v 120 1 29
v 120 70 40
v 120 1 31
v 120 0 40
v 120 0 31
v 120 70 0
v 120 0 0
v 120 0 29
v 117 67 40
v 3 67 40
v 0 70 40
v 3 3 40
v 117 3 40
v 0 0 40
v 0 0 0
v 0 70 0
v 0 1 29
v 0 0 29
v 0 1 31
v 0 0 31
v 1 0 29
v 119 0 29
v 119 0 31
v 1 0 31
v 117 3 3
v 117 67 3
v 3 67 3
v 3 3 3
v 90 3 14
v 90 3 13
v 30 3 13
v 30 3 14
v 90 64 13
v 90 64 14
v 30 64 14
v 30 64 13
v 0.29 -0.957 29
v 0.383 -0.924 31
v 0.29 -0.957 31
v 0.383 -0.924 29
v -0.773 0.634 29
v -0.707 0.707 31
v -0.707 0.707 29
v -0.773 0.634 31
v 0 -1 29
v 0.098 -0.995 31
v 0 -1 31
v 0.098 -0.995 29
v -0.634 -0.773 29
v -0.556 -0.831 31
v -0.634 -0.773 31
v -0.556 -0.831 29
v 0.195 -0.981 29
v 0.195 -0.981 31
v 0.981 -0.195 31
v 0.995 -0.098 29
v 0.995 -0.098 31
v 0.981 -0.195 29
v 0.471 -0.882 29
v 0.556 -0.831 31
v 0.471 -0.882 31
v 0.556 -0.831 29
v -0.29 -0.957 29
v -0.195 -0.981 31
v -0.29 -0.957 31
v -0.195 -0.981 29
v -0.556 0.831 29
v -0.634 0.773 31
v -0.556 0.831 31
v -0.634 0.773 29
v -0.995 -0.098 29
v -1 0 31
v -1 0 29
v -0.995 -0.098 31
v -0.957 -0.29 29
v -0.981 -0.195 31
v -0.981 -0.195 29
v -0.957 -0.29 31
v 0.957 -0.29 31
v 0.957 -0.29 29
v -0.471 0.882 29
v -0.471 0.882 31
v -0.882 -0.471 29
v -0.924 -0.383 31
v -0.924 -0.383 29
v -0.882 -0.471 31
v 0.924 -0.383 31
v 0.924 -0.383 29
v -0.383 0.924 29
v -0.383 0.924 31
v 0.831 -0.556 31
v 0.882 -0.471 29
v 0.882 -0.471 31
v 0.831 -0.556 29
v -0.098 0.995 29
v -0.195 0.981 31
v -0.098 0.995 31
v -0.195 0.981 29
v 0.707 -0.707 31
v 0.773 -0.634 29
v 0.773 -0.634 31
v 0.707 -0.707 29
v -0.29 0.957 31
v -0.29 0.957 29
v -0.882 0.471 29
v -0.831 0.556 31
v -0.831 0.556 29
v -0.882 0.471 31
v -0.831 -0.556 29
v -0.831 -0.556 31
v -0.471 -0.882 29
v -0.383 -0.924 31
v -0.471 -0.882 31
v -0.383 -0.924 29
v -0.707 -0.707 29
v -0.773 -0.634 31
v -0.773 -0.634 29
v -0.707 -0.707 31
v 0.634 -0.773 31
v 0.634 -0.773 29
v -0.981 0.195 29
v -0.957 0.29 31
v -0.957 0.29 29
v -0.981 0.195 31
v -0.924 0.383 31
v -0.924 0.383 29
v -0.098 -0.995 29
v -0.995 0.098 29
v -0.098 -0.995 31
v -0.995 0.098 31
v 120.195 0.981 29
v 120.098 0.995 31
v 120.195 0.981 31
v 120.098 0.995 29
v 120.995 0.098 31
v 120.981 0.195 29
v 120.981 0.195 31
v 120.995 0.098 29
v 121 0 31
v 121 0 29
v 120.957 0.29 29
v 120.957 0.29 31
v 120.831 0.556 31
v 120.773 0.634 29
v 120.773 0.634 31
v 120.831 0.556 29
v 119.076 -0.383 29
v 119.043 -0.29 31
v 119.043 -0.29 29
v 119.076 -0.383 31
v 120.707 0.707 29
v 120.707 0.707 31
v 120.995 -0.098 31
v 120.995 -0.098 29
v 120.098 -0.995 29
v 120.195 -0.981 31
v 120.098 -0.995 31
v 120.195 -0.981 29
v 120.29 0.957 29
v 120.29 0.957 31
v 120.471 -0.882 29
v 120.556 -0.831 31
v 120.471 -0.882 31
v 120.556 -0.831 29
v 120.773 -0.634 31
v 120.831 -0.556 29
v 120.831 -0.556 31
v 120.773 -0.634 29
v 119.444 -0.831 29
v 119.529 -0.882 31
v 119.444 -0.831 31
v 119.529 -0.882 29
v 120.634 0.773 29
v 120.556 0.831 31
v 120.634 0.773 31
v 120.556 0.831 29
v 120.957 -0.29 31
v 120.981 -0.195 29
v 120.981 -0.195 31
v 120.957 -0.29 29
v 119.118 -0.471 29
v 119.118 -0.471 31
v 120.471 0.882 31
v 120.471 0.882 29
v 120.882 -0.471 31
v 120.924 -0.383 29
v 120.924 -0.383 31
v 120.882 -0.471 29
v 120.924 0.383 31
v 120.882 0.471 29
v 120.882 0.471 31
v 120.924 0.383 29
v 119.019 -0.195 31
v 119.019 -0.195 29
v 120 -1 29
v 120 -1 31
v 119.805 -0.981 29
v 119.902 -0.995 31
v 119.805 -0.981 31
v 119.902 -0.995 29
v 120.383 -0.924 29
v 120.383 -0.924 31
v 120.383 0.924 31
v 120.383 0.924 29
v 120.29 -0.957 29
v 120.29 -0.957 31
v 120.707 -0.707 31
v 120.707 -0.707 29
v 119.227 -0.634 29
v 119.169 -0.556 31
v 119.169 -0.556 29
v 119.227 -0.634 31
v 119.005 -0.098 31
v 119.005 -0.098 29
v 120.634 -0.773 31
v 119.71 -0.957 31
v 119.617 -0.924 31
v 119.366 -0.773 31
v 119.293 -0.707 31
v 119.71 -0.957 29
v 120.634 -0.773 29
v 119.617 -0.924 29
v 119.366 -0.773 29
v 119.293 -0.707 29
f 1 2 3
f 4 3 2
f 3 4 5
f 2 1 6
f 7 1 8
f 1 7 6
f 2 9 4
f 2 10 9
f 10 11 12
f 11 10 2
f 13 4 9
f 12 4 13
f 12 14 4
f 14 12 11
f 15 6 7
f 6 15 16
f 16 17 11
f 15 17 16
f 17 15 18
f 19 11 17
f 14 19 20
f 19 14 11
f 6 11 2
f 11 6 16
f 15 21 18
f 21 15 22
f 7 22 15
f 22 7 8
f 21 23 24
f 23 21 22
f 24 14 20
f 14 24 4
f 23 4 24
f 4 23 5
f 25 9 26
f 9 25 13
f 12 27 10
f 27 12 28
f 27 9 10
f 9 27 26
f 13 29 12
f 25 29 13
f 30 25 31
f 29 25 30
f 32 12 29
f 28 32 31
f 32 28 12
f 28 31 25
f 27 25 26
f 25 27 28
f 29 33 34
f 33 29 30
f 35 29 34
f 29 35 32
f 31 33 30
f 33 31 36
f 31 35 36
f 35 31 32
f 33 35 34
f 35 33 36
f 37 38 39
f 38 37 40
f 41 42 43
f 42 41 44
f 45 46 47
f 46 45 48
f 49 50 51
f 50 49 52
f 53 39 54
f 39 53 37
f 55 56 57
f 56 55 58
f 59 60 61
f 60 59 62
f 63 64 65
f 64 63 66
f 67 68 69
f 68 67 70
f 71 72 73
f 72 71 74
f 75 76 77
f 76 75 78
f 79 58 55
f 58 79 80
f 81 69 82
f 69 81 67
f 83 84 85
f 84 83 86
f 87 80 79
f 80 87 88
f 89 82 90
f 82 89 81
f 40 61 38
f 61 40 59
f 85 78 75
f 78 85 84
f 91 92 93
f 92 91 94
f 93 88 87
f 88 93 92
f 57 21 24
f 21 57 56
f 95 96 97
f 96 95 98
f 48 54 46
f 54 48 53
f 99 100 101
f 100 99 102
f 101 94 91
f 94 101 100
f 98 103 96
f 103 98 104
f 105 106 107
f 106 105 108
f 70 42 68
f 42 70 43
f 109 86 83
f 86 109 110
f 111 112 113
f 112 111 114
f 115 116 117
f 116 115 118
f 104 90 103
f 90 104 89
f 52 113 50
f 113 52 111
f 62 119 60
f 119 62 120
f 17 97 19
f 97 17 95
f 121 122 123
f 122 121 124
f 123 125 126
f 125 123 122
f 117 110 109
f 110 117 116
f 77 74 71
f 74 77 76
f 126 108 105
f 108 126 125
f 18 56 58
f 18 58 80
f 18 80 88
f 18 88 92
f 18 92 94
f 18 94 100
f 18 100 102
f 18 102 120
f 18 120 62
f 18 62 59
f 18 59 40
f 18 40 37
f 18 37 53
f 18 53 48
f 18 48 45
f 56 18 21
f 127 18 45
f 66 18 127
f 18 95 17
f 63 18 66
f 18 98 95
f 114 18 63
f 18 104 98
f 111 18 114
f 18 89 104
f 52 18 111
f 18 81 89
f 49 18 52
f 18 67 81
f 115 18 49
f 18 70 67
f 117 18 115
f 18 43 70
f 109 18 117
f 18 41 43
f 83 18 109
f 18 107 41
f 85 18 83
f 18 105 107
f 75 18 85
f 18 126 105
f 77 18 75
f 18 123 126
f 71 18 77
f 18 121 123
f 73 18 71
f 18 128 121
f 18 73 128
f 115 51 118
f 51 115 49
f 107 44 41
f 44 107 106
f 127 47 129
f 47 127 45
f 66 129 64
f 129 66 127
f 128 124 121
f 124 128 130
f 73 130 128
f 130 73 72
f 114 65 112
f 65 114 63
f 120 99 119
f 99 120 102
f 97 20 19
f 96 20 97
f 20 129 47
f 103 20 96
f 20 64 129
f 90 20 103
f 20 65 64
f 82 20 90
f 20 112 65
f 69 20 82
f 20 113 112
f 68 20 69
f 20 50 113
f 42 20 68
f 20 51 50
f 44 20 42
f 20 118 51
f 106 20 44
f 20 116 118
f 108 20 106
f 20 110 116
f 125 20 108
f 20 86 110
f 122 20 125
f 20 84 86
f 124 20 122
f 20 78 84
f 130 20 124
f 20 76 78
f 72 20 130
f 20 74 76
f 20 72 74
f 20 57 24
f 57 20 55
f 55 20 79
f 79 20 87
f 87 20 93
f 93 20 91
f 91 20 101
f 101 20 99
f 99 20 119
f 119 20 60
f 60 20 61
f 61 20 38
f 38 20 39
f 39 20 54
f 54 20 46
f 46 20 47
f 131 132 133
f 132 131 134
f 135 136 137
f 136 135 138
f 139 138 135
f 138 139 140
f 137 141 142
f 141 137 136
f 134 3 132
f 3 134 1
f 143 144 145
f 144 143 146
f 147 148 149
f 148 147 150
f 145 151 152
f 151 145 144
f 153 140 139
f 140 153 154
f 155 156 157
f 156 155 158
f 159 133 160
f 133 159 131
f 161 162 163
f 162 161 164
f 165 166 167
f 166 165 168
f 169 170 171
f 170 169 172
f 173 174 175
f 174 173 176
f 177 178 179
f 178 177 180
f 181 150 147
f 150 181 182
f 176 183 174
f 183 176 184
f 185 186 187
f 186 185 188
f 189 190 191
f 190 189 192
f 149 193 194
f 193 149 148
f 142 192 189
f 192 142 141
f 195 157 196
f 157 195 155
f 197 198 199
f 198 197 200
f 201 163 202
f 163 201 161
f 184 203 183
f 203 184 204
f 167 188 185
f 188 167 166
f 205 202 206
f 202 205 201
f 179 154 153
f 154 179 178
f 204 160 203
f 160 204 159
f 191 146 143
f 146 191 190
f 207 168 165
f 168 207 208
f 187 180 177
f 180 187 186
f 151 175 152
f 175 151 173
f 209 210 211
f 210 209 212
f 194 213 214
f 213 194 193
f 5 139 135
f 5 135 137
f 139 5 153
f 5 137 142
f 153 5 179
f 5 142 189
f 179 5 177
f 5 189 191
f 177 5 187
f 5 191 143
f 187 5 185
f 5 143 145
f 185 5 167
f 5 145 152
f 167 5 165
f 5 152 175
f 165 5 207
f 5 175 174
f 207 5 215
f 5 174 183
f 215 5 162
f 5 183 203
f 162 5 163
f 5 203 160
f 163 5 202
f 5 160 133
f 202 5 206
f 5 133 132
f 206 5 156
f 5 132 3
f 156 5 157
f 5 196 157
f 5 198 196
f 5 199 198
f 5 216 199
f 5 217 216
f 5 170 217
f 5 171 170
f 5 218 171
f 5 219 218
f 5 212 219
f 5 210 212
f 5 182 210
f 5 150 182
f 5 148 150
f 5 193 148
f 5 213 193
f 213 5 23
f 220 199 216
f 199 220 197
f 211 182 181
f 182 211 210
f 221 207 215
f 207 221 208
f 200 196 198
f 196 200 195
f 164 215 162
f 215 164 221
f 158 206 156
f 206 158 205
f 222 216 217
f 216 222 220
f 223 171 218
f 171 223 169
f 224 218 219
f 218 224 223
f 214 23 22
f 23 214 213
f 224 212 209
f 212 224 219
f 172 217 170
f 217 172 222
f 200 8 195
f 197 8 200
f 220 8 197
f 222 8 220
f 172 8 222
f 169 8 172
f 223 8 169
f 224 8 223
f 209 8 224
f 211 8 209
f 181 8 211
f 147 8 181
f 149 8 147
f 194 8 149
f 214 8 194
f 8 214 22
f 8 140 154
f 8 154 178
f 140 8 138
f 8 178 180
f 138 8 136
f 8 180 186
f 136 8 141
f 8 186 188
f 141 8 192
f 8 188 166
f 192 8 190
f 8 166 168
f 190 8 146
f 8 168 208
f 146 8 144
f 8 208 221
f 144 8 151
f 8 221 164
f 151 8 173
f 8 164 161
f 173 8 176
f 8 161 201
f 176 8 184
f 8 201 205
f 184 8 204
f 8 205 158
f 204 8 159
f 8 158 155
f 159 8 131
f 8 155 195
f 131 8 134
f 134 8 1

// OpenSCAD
// Buffer Tank Design for Mini Horizontal Gel-Electrophoresis Box - CORRECTED VERSION

// --- Dimensions ---
X_outer = 120;    // Outer length of the tank (mm)
Y_outer = 70;     // Outer width of the tank (mm)
Z_outer = 40;     // Outer height of the tank (mm)
Wall_thickness = 3; // Thickness of the walls (mm)
Floor_thickness = 3; // Thickness of the floor (mm)

Platform_length = 60;  // Length of the central platform in X (mm)
Platform_height_above_inner_floor = 10; // Height of the platform above the inner floor (mm)
Hole_diameter = 2; // Diameter of the electrode holes (mm)
Hole_z = 30;      // Z-level for the electrode holes (mm)

// --- Calculated Inner Dimensions ---
Inner_X = X_outer - 2 * Wall_thickness; // 120 - 6 = 114 mm
Inner_Y = Y_outer - 2 * Wall_thickness; // 70 - 6 = 64 mm

// Z-levels
Inner_Z_floor = Floor_thickness; // Inner floor is at z=3 (since floor is at z=0)
Platform_Z = Inner_Z_floor + Platform_height_above_inner_floor; // 3 + 10 = 13 mm

// --- Main Tank Body Construction ---
module tank_shell() {
    difference() {
        // 1. Outer solid block (defines the outer boundary)
        cube([X_outer, Y_outer, Z_outer]);

        // 2. Inner void subtraction (ensures 3mm walls)
        translate([Wall_thickness, Wall_thickness, 0])
        cube([Inner_X, Inner_Y, Z_outer]);
    }
}

// --- Floor Construction ---
module tank_floor() {
    // The floor is at z=0. We model the solid block that forms the base.
    translate([0, 0, 0])
    cube([X_outer, Y_outer, Floor_thickness]);
}

// --- Gel Platform Construction ---
module gel_platform() {
    // The platform spans the full inner width (Inner_Y = 64 mm) and is 60mm long in X, centered.
    // It sits on top of the floor structure.
    translate([ (X_outer - Platform_length) / 2, 0, Platform_Z ])
    cube([Platform_length, Inner_Y, 1]); // A thin block representing the platform structure itself.
}

// --- Electrode Holes ---
module electrode_holes() {
    // Drill a 2mm diameter horizontal hole along X at y = 0 (outer wall) at z = Hole_z for both ends.

    // Hole at X = 0 (Left end wall)
    translate([0, 0, Hole_z - Hole_diameter/2])
    cylinder(r = Hole_diameter / 2, h = 2, $fn = 64);

    // Hole at X = X_outer (Right end wall)
    translate([X_outer, 0, Hole_z - Hole_diameter/2])
    cylinder(r = Hole_diameter / 2, h = 2, $fn = 64);
}


// --- Final Assembly ---
union() {
    tank_shell();
    tank_floor();
    gel_platform();
}

// Add the electrode holes to the final assembly (These are drilled through the shell)
electrode_holes();
